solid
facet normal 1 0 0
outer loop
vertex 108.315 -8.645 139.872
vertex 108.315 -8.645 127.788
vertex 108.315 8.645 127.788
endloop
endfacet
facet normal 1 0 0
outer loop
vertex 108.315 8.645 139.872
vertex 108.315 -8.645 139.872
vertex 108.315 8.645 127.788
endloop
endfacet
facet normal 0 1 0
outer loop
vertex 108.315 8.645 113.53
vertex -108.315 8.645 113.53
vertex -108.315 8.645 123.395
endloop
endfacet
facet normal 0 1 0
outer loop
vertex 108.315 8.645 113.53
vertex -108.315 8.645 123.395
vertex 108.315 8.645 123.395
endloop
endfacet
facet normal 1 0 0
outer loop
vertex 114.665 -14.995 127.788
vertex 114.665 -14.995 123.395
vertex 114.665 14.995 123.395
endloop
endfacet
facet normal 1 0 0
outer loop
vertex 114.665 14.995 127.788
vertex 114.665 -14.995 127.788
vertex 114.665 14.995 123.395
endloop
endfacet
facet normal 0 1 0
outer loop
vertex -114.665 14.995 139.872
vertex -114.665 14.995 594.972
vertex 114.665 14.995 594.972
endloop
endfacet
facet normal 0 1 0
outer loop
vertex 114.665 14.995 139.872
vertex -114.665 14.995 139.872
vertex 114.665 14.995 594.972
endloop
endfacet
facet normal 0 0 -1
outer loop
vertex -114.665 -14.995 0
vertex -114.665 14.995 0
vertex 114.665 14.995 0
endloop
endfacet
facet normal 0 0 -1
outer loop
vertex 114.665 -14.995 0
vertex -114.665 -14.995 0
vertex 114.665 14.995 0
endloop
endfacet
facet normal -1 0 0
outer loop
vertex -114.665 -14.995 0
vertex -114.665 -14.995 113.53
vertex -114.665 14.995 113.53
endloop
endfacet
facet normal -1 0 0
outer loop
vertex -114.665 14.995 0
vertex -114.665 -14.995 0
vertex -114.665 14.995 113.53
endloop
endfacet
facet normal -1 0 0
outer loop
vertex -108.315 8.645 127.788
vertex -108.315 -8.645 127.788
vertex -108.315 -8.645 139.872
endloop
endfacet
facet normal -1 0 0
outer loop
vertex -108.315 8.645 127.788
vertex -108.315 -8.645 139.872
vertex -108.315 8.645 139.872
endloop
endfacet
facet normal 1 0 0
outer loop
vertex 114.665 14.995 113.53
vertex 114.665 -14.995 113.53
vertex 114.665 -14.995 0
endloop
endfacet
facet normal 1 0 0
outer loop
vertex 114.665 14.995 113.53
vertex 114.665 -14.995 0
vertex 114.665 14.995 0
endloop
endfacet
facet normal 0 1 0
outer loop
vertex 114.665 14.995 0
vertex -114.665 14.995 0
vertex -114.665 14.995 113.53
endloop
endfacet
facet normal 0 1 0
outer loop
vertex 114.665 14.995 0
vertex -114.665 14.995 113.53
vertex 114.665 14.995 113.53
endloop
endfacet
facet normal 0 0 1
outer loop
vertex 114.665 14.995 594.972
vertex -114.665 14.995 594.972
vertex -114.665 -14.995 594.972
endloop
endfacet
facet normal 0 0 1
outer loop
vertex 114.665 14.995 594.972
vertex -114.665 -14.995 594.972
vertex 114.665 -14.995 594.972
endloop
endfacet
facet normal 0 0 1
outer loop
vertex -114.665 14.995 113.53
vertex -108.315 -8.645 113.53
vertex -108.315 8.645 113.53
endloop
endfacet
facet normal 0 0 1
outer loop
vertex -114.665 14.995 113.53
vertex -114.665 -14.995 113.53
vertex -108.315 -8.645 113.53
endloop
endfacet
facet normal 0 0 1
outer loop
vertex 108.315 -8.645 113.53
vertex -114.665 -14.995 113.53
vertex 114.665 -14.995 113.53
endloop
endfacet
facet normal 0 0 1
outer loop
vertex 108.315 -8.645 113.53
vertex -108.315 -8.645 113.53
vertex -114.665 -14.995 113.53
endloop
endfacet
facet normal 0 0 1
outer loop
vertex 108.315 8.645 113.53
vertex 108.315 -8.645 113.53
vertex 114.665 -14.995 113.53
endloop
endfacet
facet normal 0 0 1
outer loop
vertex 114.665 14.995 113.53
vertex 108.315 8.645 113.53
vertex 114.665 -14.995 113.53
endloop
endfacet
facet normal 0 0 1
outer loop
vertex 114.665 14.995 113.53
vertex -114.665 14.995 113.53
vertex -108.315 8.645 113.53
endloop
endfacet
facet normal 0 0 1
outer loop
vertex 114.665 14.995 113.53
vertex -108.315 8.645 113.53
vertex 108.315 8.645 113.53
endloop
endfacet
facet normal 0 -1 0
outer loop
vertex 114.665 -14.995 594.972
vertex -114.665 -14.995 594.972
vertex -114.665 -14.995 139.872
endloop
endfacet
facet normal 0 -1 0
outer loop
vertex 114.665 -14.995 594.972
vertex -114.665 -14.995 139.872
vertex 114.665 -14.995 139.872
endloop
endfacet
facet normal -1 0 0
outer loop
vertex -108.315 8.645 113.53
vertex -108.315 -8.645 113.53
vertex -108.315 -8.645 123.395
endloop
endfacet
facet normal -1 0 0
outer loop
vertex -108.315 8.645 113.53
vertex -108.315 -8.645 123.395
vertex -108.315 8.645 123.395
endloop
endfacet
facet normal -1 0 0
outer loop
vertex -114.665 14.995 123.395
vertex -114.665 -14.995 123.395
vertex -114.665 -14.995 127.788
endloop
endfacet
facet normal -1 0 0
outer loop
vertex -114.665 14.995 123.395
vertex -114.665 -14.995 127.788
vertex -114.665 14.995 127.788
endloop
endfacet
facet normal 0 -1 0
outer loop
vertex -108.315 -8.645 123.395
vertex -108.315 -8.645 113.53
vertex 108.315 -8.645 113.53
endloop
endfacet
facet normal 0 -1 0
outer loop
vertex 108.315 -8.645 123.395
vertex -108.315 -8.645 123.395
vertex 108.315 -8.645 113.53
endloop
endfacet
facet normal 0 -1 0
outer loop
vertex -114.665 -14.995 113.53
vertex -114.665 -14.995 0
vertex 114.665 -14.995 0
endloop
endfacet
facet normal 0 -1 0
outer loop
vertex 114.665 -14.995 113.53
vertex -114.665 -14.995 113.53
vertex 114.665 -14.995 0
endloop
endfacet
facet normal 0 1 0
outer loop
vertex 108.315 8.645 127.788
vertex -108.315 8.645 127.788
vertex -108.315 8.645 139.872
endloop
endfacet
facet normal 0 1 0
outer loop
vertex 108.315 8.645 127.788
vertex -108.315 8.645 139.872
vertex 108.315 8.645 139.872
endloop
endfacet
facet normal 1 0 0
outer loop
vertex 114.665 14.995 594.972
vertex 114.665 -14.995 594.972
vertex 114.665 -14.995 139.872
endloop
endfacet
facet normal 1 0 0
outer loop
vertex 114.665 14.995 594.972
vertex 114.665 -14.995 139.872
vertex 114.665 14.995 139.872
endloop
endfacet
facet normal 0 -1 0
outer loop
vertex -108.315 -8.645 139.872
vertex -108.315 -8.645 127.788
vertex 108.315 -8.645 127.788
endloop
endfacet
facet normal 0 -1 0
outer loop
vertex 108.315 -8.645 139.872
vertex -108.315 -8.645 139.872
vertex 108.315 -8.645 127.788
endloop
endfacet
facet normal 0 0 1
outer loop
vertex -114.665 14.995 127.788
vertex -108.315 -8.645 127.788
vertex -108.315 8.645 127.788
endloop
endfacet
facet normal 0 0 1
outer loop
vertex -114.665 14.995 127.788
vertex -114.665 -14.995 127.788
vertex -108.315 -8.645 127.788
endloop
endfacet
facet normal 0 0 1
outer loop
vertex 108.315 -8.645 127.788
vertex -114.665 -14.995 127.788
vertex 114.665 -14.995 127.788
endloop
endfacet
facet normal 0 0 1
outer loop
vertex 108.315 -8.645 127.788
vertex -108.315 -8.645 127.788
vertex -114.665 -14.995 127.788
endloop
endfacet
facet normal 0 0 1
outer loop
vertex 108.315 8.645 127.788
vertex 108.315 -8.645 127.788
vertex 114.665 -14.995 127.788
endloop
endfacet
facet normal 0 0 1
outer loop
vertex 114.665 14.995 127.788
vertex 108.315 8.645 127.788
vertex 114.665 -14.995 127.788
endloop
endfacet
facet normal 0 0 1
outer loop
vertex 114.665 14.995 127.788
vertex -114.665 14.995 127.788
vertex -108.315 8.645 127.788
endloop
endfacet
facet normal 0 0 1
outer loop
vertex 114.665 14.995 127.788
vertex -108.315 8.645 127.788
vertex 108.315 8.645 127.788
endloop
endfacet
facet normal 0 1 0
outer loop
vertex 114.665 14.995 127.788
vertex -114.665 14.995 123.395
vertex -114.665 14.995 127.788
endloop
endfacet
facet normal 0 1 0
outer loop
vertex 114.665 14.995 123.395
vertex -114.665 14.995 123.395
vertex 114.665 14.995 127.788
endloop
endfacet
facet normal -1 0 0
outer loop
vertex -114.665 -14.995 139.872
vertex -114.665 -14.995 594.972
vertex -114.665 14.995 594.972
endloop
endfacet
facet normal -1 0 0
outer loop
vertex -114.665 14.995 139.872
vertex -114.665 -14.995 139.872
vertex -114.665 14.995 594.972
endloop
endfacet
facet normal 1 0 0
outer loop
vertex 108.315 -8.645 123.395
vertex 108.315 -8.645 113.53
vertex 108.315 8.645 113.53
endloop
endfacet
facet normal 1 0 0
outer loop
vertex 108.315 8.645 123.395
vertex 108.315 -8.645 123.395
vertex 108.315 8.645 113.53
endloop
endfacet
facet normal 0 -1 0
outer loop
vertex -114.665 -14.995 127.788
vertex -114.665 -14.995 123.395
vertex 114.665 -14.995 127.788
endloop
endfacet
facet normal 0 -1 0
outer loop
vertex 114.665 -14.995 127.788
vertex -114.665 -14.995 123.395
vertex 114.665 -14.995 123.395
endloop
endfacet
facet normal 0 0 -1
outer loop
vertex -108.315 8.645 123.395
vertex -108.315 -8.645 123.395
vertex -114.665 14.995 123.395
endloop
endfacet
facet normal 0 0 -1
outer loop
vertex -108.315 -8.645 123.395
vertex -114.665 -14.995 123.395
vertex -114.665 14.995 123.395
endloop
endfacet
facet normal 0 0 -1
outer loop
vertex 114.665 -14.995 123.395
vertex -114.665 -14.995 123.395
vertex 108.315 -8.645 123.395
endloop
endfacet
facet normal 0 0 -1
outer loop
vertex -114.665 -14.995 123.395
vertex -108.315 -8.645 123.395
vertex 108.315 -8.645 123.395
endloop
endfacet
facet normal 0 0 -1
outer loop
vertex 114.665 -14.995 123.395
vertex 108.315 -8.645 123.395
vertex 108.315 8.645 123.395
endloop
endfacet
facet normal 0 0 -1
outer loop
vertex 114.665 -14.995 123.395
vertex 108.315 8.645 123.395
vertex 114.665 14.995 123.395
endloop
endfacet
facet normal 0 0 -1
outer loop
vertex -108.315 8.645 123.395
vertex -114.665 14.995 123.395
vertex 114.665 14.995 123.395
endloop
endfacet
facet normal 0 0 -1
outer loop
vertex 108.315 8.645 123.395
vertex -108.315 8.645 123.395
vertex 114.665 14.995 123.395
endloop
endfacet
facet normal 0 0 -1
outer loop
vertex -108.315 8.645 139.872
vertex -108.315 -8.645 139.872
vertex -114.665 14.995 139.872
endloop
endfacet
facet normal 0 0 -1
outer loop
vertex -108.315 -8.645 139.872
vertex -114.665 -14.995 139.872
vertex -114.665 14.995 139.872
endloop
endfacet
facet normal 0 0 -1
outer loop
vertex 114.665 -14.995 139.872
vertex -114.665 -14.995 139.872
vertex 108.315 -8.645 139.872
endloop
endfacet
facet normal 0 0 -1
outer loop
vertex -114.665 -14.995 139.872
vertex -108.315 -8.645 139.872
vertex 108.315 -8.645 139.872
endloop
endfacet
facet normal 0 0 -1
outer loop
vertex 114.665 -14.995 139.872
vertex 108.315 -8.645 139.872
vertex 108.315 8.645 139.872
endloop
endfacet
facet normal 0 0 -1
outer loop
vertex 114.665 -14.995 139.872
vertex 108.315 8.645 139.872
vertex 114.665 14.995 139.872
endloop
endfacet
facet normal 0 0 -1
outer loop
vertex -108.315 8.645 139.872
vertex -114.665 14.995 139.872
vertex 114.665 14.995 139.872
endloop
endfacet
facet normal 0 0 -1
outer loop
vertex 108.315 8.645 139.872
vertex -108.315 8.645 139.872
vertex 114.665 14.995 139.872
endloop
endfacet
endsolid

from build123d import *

# Parameters (mm, degrees)
F0_W     = 229.329064
F0_H     = 29.990316
F1_DEPTH = 113.530092
F2_W     = 216.629066
F2_H     = 17.290316
F3_DEPTH = 26.342174
F5_W     = 229.329064
F5_H     = 29.990316
F6_DEPTH = 4.393091
F7_W     = 229.329064
F7_H     = 29.990316
F7_W_2   = 216.629066
F7_H_2   = 17.290316
F8_DEPTH = 455.099583


with BuildPart() as f1:
    # F0 (on Top) → F1 (new body)
    with BuildSketch(Plane.XY):
        Rectangle(F0_W, F0_H)
    extrude(amount=F1_DEPTH)

    # F2 (on face) → F3 (join)
    with BuildSketch(Plane.XY.offset(113.530092)):
        Rectangle(F2_W, F2_H)
    extrude(amount=F3_DEPTH)

    # F5 (on offset) → F6 (join)
    with BuildSketch(Plane.XY.offset(123.39519)):
        Rectangle(F5_W, F5_H)
    extrude(amount=F6_DEPTH)

    # F7 (on face) → F8 (join)
    with BuildSketch(Plane.XY.offset(139.872266)):
        Rectangle(F7_W, F7_H)
        Rectangle(F7_W_2, F7_H_2, mode=Mode.SUBTRACT)
        Rectangle(F7_W_2, F7_H_2)
    extrude(amount=F8_DEPTH)


solid = f1.part
